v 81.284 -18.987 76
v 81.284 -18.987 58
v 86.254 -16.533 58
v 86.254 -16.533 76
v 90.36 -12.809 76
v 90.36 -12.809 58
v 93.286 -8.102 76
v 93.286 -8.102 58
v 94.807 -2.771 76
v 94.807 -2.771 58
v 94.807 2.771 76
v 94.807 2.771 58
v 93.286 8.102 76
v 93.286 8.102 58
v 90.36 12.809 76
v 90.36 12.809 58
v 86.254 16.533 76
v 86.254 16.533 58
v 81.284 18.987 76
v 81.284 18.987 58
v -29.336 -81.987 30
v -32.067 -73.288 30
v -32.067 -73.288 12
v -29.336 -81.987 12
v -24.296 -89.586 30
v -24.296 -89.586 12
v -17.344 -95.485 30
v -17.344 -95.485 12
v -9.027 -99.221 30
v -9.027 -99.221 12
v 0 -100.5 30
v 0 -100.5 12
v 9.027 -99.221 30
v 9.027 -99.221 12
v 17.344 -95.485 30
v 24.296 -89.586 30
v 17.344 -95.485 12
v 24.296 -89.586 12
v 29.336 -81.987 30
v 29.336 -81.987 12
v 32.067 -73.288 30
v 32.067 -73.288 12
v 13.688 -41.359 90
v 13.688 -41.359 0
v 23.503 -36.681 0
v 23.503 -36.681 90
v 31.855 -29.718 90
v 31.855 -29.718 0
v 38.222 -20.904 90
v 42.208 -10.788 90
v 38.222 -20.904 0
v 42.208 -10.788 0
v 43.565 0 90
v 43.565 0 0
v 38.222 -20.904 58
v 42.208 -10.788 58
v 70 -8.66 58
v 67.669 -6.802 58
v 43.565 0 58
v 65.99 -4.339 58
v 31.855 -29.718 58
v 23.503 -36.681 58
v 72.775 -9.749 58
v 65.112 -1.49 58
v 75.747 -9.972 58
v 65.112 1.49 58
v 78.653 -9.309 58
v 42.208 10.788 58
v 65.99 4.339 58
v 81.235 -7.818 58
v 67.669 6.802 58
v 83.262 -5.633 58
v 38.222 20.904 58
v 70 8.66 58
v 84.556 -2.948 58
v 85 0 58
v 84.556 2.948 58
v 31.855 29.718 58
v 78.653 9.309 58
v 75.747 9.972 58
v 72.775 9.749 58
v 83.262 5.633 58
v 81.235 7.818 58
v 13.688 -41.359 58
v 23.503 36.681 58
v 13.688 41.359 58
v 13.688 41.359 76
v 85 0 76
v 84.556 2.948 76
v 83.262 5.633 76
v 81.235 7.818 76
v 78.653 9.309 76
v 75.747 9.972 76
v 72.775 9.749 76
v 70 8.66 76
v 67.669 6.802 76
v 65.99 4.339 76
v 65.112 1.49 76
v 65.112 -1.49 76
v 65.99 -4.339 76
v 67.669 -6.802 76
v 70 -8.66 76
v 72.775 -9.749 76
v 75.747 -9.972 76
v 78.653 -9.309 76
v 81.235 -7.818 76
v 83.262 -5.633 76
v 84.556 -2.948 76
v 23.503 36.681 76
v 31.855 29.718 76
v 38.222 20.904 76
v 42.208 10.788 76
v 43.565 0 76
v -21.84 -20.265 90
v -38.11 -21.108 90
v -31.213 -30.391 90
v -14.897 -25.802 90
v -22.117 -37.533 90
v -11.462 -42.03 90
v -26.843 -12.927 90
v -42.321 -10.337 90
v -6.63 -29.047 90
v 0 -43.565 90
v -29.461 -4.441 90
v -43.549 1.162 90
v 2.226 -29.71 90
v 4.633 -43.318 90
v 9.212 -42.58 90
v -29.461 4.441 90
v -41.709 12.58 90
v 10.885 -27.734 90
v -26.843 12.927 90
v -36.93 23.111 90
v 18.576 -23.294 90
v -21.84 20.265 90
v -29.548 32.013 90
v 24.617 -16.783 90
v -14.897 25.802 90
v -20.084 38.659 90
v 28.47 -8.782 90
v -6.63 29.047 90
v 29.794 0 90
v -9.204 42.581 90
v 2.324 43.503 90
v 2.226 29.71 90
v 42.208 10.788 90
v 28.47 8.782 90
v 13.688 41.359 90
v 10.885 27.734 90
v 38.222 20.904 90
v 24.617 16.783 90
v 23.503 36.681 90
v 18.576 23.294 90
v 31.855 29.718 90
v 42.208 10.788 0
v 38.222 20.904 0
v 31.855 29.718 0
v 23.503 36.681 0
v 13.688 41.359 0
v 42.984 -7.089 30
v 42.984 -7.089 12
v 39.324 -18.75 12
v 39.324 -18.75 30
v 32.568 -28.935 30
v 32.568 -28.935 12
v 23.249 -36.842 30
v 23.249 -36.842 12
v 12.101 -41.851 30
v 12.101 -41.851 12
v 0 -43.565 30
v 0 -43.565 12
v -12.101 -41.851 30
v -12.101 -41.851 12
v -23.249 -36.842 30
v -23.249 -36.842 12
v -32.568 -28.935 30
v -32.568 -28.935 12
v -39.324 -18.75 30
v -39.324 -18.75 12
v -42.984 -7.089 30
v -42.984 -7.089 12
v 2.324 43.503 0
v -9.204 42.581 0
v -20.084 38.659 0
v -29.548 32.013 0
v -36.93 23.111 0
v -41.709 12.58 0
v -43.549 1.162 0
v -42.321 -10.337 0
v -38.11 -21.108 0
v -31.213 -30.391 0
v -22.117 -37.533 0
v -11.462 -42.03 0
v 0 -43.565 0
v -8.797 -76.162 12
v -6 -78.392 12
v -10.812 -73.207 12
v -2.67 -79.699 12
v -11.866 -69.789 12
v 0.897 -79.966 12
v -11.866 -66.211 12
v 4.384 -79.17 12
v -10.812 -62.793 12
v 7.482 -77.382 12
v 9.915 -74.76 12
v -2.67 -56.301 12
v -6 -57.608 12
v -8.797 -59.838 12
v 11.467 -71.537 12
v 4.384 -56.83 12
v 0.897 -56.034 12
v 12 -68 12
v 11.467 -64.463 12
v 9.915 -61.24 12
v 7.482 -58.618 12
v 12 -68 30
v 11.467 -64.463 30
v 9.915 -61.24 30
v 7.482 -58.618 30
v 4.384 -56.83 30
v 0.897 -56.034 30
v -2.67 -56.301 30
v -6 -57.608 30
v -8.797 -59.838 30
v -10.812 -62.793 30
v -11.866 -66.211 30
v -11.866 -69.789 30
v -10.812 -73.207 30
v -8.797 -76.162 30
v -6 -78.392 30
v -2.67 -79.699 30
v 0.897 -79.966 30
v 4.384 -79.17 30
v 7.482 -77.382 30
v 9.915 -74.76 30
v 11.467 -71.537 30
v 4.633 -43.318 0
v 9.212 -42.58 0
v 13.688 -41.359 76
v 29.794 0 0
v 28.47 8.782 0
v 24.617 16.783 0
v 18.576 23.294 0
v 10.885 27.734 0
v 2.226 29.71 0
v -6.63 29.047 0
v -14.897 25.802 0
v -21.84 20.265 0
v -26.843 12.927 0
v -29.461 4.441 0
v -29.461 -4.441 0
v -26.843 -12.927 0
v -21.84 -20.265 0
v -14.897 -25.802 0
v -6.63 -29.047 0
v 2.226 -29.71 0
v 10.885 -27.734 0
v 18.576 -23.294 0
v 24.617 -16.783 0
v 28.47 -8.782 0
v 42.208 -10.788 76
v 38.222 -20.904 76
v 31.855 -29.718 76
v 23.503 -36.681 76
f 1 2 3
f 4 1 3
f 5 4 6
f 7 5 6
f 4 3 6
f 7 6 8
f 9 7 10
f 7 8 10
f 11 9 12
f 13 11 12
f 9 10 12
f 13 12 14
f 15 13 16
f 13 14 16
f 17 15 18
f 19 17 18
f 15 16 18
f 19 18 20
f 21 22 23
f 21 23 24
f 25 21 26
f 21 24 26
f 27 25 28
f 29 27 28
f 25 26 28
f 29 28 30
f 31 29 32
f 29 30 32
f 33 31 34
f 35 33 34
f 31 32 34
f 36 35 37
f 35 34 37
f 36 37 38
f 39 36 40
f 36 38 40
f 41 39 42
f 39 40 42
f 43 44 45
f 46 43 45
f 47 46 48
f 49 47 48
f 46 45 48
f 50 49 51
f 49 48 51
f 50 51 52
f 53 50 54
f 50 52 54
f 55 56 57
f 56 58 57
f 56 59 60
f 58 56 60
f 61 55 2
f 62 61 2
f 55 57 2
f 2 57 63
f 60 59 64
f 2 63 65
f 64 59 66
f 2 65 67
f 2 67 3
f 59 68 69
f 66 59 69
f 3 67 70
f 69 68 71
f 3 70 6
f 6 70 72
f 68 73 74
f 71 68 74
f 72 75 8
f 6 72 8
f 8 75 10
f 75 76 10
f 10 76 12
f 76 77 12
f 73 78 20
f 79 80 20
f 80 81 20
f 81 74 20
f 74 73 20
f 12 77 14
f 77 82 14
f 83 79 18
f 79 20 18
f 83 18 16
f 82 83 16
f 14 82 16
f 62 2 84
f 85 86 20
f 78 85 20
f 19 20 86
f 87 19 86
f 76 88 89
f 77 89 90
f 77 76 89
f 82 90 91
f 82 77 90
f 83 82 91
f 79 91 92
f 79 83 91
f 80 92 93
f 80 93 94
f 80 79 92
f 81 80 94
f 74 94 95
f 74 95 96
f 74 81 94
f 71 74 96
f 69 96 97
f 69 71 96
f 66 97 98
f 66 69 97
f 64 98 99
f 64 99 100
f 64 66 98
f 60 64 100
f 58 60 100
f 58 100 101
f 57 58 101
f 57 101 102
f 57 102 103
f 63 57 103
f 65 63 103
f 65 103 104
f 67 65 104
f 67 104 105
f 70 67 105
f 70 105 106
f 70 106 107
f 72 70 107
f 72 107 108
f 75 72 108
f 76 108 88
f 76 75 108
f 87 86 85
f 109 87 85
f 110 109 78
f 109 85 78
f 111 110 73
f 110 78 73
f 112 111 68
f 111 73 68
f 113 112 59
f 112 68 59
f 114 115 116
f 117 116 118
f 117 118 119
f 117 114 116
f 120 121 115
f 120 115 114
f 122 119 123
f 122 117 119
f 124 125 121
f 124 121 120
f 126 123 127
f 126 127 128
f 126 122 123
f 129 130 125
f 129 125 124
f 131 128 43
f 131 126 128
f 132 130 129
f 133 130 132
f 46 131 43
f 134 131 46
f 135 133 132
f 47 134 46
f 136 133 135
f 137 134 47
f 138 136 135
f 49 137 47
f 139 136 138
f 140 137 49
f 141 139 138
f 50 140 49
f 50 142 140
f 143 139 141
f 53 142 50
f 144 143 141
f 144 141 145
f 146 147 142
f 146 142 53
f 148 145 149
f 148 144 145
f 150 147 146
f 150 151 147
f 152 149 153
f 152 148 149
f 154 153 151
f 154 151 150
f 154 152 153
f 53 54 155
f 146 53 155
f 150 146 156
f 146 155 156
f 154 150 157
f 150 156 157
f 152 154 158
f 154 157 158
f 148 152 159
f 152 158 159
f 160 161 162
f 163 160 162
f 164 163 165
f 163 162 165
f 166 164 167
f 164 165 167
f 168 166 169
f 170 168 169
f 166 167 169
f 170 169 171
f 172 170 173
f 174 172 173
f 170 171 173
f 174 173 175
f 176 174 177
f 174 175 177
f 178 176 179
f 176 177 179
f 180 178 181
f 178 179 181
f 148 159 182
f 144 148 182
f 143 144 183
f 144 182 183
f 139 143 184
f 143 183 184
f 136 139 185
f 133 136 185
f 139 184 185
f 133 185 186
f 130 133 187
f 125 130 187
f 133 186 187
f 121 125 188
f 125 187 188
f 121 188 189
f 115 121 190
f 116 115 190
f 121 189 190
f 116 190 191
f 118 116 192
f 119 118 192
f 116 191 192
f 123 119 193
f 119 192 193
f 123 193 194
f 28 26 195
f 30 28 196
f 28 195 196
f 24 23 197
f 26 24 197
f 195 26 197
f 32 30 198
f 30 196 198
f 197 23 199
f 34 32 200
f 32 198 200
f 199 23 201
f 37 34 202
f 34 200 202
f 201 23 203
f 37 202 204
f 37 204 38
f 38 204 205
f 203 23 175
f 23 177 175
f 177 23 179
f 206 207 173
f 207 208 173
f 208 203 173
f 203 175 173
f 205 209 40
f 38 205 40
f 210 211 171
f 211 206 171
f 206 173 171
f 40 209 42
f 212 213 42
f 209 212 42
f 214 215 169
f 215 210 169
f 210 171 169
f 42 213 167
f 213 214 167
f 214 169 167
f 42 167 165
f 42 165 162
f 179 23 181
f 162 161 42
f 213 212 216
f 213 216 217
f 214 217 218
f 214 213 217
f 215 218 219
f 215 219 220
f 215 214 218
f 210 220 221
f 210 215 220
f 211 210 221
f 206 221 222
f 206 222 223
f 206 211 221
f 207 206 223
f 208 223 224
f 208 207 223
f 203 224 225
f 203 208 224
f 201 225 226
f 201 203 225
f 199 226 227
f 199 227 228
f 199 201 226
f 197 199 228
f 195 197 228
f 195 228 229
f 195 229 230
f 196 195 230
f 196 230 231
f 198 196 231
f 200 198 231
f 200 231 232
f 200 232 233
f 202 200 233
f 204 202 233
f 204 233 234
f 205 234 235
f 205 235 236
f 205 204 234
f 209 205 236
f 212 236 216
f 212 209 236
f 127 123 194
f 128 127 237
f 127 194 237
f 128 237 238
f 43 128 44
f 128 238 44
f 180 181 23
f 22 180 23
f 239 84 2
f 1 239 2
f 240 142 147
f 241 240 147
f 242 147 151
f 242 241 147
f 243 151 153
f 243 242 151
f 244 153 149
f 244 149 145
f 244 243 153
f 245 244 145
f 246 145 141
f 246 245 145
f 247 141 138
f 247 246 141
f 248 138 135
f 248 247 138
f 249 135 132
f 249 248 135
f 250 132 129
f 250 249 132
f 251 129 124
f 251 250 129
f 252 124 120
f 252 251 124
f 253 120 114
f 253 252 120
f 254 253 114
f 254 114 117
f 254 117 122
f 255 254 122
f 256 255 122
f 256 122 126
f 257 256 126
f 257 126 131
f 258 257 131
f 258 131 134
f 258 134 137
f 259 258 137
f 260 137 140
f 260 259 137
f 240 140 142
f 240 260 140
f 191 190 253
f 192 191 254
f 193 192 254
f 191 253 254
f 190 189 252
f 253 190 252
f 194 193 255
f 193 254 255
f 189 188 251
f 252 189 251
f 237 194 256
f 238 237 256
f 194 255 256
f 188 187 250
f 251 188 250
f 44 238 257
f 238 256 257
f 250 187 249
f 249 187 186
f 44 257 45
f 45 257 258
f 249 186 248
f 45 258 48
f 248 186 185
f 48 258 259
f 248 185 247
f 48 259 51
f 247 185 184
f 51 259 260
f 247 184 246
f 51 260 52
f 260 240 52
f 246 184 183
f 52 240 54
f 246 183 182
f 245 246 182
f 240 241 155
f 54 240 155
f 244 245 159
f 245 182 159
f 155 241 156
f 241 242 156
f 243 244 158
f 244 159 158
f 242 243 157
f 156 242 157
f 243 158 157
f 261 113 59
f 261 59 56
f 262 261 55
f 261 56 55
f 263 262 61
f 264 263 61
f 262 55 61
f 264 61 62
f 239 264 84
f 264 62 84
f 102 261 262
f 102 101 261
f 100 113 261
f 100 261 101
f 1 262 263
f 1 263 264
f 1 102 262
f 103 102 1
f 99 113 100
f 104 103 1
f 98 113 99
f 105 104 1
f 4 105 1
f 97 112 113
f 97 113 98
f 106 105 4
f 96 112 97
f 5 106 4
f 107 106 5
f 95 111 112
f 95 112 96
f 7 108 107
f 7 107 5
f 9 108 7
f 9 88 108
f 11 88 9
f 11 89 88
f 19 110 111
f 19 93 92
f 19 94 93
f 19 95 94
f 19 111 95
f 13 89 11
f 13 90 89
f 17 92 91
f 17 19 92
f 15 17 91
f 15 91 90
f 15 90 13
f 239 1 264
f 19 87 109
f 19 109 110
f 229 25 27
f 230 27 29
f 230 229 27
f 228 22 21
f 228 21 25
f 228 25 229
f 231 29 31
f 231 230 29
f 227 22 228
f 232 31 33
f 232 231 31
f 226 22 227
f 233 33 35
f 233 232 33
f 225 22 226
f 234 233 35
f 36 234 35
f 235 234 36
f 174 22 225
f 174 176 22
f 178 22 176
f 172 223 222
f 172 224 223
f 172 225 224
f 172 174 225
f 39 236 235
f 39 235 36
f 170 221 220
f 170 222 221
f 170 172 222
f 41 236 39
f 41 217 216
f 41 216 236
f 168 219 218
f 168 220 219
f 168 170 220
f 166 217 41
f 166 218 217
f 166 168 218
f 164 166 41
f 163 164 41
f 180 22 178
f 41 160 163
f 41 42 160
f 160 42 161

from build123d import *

# Parameters (mm, degrees)
F0_R     = 29.793604
F1_DEPTH = 90
F0_R_2   = 10
F2_DEPTH = 18
F4_R     = 12
F5_DEPTH = 18


with BuildPart() as f1:
    # F0 (on Top) → F1 (new body)
    with BuildSketch(Plane.XY):
        with BuildLine():
            ThreePointArc((13.688006, -41.358628), (35.314401, -25.510601), (43.564867, 0))
            ThreePointArc((43.564867, 0), (35.3144, 25.510601), (13.688004, 41.358629))
            ThreePointArc((13.688004, 41.358629), (-43.009771, 6.932333), (0, -43.564867))
            ThreePointArc((0, -43.564867), (6.932334, -43.009771), (13.688006, -41.358628))
        make_face()
        Circle(F0_R, mode=Mode.SUBTRACT)
    extrude(amount=F1_DEPTH)


with BuildPart() as f2:
    # F0 (on Top) → F2 (new body)
    with BuildSketch(Plane.XY):
        with BuildLine():
            ThreePointArc((13.688004, 41.358629), (35.3144, 25.510601), (43.564867, 0))
            ThreePointArc((43.564867, 0), (35.314401, -25.510601), (13.688006, -41.358628))
            Line((13.688006, -41.358628), (81.283965, -18.987148))
            ThreePointArc((81.283965, -18.987148), (95, 0), (81.283965, 18.987148))
            Line((81.283965, 18.987148), (13.688004, 41.358629))
        make_face()
        with Locations((75, 0)):
            Circle(F0_R_2, mode=Mode.SUBTRACT)
    extrude(amount=F2_DEPTH)


with BuildPart() as f2_1:
    # F3: moved
    add(f2.part.moved(Location((0, 0, 58))))


with BuildPart() as f5:
    # F4 (on Top) → F5 (new body)
    with BuildSketch(Plane.XY):
        with BuildLine():
            Line((-42.984257, -7.088816), (-32.066857, -73.288356))
            ThreePointArc((-32.066857, -73.288356), (0, -100.5), (32.066857, -73.288356))
            Line((32.066857, -73.288356), (42.984257, -7.088815))
            ThreePointArc((42.984257, -7.088815), (0, -43.564867), (-42.984257, -7.088816))
        make_face()
        with Locations((0, -68)):
            Circle(F4_R, mode=Mode.SUBTRACT)
    extrude(amount=F5_DEPTH)


with BuildPart() as f5_1:
    # F6: moved
    add(f5.part.moved(Location((0, 0, 12))))


solid = Compound([f1.part, f2_1.part, f5_1.part])
